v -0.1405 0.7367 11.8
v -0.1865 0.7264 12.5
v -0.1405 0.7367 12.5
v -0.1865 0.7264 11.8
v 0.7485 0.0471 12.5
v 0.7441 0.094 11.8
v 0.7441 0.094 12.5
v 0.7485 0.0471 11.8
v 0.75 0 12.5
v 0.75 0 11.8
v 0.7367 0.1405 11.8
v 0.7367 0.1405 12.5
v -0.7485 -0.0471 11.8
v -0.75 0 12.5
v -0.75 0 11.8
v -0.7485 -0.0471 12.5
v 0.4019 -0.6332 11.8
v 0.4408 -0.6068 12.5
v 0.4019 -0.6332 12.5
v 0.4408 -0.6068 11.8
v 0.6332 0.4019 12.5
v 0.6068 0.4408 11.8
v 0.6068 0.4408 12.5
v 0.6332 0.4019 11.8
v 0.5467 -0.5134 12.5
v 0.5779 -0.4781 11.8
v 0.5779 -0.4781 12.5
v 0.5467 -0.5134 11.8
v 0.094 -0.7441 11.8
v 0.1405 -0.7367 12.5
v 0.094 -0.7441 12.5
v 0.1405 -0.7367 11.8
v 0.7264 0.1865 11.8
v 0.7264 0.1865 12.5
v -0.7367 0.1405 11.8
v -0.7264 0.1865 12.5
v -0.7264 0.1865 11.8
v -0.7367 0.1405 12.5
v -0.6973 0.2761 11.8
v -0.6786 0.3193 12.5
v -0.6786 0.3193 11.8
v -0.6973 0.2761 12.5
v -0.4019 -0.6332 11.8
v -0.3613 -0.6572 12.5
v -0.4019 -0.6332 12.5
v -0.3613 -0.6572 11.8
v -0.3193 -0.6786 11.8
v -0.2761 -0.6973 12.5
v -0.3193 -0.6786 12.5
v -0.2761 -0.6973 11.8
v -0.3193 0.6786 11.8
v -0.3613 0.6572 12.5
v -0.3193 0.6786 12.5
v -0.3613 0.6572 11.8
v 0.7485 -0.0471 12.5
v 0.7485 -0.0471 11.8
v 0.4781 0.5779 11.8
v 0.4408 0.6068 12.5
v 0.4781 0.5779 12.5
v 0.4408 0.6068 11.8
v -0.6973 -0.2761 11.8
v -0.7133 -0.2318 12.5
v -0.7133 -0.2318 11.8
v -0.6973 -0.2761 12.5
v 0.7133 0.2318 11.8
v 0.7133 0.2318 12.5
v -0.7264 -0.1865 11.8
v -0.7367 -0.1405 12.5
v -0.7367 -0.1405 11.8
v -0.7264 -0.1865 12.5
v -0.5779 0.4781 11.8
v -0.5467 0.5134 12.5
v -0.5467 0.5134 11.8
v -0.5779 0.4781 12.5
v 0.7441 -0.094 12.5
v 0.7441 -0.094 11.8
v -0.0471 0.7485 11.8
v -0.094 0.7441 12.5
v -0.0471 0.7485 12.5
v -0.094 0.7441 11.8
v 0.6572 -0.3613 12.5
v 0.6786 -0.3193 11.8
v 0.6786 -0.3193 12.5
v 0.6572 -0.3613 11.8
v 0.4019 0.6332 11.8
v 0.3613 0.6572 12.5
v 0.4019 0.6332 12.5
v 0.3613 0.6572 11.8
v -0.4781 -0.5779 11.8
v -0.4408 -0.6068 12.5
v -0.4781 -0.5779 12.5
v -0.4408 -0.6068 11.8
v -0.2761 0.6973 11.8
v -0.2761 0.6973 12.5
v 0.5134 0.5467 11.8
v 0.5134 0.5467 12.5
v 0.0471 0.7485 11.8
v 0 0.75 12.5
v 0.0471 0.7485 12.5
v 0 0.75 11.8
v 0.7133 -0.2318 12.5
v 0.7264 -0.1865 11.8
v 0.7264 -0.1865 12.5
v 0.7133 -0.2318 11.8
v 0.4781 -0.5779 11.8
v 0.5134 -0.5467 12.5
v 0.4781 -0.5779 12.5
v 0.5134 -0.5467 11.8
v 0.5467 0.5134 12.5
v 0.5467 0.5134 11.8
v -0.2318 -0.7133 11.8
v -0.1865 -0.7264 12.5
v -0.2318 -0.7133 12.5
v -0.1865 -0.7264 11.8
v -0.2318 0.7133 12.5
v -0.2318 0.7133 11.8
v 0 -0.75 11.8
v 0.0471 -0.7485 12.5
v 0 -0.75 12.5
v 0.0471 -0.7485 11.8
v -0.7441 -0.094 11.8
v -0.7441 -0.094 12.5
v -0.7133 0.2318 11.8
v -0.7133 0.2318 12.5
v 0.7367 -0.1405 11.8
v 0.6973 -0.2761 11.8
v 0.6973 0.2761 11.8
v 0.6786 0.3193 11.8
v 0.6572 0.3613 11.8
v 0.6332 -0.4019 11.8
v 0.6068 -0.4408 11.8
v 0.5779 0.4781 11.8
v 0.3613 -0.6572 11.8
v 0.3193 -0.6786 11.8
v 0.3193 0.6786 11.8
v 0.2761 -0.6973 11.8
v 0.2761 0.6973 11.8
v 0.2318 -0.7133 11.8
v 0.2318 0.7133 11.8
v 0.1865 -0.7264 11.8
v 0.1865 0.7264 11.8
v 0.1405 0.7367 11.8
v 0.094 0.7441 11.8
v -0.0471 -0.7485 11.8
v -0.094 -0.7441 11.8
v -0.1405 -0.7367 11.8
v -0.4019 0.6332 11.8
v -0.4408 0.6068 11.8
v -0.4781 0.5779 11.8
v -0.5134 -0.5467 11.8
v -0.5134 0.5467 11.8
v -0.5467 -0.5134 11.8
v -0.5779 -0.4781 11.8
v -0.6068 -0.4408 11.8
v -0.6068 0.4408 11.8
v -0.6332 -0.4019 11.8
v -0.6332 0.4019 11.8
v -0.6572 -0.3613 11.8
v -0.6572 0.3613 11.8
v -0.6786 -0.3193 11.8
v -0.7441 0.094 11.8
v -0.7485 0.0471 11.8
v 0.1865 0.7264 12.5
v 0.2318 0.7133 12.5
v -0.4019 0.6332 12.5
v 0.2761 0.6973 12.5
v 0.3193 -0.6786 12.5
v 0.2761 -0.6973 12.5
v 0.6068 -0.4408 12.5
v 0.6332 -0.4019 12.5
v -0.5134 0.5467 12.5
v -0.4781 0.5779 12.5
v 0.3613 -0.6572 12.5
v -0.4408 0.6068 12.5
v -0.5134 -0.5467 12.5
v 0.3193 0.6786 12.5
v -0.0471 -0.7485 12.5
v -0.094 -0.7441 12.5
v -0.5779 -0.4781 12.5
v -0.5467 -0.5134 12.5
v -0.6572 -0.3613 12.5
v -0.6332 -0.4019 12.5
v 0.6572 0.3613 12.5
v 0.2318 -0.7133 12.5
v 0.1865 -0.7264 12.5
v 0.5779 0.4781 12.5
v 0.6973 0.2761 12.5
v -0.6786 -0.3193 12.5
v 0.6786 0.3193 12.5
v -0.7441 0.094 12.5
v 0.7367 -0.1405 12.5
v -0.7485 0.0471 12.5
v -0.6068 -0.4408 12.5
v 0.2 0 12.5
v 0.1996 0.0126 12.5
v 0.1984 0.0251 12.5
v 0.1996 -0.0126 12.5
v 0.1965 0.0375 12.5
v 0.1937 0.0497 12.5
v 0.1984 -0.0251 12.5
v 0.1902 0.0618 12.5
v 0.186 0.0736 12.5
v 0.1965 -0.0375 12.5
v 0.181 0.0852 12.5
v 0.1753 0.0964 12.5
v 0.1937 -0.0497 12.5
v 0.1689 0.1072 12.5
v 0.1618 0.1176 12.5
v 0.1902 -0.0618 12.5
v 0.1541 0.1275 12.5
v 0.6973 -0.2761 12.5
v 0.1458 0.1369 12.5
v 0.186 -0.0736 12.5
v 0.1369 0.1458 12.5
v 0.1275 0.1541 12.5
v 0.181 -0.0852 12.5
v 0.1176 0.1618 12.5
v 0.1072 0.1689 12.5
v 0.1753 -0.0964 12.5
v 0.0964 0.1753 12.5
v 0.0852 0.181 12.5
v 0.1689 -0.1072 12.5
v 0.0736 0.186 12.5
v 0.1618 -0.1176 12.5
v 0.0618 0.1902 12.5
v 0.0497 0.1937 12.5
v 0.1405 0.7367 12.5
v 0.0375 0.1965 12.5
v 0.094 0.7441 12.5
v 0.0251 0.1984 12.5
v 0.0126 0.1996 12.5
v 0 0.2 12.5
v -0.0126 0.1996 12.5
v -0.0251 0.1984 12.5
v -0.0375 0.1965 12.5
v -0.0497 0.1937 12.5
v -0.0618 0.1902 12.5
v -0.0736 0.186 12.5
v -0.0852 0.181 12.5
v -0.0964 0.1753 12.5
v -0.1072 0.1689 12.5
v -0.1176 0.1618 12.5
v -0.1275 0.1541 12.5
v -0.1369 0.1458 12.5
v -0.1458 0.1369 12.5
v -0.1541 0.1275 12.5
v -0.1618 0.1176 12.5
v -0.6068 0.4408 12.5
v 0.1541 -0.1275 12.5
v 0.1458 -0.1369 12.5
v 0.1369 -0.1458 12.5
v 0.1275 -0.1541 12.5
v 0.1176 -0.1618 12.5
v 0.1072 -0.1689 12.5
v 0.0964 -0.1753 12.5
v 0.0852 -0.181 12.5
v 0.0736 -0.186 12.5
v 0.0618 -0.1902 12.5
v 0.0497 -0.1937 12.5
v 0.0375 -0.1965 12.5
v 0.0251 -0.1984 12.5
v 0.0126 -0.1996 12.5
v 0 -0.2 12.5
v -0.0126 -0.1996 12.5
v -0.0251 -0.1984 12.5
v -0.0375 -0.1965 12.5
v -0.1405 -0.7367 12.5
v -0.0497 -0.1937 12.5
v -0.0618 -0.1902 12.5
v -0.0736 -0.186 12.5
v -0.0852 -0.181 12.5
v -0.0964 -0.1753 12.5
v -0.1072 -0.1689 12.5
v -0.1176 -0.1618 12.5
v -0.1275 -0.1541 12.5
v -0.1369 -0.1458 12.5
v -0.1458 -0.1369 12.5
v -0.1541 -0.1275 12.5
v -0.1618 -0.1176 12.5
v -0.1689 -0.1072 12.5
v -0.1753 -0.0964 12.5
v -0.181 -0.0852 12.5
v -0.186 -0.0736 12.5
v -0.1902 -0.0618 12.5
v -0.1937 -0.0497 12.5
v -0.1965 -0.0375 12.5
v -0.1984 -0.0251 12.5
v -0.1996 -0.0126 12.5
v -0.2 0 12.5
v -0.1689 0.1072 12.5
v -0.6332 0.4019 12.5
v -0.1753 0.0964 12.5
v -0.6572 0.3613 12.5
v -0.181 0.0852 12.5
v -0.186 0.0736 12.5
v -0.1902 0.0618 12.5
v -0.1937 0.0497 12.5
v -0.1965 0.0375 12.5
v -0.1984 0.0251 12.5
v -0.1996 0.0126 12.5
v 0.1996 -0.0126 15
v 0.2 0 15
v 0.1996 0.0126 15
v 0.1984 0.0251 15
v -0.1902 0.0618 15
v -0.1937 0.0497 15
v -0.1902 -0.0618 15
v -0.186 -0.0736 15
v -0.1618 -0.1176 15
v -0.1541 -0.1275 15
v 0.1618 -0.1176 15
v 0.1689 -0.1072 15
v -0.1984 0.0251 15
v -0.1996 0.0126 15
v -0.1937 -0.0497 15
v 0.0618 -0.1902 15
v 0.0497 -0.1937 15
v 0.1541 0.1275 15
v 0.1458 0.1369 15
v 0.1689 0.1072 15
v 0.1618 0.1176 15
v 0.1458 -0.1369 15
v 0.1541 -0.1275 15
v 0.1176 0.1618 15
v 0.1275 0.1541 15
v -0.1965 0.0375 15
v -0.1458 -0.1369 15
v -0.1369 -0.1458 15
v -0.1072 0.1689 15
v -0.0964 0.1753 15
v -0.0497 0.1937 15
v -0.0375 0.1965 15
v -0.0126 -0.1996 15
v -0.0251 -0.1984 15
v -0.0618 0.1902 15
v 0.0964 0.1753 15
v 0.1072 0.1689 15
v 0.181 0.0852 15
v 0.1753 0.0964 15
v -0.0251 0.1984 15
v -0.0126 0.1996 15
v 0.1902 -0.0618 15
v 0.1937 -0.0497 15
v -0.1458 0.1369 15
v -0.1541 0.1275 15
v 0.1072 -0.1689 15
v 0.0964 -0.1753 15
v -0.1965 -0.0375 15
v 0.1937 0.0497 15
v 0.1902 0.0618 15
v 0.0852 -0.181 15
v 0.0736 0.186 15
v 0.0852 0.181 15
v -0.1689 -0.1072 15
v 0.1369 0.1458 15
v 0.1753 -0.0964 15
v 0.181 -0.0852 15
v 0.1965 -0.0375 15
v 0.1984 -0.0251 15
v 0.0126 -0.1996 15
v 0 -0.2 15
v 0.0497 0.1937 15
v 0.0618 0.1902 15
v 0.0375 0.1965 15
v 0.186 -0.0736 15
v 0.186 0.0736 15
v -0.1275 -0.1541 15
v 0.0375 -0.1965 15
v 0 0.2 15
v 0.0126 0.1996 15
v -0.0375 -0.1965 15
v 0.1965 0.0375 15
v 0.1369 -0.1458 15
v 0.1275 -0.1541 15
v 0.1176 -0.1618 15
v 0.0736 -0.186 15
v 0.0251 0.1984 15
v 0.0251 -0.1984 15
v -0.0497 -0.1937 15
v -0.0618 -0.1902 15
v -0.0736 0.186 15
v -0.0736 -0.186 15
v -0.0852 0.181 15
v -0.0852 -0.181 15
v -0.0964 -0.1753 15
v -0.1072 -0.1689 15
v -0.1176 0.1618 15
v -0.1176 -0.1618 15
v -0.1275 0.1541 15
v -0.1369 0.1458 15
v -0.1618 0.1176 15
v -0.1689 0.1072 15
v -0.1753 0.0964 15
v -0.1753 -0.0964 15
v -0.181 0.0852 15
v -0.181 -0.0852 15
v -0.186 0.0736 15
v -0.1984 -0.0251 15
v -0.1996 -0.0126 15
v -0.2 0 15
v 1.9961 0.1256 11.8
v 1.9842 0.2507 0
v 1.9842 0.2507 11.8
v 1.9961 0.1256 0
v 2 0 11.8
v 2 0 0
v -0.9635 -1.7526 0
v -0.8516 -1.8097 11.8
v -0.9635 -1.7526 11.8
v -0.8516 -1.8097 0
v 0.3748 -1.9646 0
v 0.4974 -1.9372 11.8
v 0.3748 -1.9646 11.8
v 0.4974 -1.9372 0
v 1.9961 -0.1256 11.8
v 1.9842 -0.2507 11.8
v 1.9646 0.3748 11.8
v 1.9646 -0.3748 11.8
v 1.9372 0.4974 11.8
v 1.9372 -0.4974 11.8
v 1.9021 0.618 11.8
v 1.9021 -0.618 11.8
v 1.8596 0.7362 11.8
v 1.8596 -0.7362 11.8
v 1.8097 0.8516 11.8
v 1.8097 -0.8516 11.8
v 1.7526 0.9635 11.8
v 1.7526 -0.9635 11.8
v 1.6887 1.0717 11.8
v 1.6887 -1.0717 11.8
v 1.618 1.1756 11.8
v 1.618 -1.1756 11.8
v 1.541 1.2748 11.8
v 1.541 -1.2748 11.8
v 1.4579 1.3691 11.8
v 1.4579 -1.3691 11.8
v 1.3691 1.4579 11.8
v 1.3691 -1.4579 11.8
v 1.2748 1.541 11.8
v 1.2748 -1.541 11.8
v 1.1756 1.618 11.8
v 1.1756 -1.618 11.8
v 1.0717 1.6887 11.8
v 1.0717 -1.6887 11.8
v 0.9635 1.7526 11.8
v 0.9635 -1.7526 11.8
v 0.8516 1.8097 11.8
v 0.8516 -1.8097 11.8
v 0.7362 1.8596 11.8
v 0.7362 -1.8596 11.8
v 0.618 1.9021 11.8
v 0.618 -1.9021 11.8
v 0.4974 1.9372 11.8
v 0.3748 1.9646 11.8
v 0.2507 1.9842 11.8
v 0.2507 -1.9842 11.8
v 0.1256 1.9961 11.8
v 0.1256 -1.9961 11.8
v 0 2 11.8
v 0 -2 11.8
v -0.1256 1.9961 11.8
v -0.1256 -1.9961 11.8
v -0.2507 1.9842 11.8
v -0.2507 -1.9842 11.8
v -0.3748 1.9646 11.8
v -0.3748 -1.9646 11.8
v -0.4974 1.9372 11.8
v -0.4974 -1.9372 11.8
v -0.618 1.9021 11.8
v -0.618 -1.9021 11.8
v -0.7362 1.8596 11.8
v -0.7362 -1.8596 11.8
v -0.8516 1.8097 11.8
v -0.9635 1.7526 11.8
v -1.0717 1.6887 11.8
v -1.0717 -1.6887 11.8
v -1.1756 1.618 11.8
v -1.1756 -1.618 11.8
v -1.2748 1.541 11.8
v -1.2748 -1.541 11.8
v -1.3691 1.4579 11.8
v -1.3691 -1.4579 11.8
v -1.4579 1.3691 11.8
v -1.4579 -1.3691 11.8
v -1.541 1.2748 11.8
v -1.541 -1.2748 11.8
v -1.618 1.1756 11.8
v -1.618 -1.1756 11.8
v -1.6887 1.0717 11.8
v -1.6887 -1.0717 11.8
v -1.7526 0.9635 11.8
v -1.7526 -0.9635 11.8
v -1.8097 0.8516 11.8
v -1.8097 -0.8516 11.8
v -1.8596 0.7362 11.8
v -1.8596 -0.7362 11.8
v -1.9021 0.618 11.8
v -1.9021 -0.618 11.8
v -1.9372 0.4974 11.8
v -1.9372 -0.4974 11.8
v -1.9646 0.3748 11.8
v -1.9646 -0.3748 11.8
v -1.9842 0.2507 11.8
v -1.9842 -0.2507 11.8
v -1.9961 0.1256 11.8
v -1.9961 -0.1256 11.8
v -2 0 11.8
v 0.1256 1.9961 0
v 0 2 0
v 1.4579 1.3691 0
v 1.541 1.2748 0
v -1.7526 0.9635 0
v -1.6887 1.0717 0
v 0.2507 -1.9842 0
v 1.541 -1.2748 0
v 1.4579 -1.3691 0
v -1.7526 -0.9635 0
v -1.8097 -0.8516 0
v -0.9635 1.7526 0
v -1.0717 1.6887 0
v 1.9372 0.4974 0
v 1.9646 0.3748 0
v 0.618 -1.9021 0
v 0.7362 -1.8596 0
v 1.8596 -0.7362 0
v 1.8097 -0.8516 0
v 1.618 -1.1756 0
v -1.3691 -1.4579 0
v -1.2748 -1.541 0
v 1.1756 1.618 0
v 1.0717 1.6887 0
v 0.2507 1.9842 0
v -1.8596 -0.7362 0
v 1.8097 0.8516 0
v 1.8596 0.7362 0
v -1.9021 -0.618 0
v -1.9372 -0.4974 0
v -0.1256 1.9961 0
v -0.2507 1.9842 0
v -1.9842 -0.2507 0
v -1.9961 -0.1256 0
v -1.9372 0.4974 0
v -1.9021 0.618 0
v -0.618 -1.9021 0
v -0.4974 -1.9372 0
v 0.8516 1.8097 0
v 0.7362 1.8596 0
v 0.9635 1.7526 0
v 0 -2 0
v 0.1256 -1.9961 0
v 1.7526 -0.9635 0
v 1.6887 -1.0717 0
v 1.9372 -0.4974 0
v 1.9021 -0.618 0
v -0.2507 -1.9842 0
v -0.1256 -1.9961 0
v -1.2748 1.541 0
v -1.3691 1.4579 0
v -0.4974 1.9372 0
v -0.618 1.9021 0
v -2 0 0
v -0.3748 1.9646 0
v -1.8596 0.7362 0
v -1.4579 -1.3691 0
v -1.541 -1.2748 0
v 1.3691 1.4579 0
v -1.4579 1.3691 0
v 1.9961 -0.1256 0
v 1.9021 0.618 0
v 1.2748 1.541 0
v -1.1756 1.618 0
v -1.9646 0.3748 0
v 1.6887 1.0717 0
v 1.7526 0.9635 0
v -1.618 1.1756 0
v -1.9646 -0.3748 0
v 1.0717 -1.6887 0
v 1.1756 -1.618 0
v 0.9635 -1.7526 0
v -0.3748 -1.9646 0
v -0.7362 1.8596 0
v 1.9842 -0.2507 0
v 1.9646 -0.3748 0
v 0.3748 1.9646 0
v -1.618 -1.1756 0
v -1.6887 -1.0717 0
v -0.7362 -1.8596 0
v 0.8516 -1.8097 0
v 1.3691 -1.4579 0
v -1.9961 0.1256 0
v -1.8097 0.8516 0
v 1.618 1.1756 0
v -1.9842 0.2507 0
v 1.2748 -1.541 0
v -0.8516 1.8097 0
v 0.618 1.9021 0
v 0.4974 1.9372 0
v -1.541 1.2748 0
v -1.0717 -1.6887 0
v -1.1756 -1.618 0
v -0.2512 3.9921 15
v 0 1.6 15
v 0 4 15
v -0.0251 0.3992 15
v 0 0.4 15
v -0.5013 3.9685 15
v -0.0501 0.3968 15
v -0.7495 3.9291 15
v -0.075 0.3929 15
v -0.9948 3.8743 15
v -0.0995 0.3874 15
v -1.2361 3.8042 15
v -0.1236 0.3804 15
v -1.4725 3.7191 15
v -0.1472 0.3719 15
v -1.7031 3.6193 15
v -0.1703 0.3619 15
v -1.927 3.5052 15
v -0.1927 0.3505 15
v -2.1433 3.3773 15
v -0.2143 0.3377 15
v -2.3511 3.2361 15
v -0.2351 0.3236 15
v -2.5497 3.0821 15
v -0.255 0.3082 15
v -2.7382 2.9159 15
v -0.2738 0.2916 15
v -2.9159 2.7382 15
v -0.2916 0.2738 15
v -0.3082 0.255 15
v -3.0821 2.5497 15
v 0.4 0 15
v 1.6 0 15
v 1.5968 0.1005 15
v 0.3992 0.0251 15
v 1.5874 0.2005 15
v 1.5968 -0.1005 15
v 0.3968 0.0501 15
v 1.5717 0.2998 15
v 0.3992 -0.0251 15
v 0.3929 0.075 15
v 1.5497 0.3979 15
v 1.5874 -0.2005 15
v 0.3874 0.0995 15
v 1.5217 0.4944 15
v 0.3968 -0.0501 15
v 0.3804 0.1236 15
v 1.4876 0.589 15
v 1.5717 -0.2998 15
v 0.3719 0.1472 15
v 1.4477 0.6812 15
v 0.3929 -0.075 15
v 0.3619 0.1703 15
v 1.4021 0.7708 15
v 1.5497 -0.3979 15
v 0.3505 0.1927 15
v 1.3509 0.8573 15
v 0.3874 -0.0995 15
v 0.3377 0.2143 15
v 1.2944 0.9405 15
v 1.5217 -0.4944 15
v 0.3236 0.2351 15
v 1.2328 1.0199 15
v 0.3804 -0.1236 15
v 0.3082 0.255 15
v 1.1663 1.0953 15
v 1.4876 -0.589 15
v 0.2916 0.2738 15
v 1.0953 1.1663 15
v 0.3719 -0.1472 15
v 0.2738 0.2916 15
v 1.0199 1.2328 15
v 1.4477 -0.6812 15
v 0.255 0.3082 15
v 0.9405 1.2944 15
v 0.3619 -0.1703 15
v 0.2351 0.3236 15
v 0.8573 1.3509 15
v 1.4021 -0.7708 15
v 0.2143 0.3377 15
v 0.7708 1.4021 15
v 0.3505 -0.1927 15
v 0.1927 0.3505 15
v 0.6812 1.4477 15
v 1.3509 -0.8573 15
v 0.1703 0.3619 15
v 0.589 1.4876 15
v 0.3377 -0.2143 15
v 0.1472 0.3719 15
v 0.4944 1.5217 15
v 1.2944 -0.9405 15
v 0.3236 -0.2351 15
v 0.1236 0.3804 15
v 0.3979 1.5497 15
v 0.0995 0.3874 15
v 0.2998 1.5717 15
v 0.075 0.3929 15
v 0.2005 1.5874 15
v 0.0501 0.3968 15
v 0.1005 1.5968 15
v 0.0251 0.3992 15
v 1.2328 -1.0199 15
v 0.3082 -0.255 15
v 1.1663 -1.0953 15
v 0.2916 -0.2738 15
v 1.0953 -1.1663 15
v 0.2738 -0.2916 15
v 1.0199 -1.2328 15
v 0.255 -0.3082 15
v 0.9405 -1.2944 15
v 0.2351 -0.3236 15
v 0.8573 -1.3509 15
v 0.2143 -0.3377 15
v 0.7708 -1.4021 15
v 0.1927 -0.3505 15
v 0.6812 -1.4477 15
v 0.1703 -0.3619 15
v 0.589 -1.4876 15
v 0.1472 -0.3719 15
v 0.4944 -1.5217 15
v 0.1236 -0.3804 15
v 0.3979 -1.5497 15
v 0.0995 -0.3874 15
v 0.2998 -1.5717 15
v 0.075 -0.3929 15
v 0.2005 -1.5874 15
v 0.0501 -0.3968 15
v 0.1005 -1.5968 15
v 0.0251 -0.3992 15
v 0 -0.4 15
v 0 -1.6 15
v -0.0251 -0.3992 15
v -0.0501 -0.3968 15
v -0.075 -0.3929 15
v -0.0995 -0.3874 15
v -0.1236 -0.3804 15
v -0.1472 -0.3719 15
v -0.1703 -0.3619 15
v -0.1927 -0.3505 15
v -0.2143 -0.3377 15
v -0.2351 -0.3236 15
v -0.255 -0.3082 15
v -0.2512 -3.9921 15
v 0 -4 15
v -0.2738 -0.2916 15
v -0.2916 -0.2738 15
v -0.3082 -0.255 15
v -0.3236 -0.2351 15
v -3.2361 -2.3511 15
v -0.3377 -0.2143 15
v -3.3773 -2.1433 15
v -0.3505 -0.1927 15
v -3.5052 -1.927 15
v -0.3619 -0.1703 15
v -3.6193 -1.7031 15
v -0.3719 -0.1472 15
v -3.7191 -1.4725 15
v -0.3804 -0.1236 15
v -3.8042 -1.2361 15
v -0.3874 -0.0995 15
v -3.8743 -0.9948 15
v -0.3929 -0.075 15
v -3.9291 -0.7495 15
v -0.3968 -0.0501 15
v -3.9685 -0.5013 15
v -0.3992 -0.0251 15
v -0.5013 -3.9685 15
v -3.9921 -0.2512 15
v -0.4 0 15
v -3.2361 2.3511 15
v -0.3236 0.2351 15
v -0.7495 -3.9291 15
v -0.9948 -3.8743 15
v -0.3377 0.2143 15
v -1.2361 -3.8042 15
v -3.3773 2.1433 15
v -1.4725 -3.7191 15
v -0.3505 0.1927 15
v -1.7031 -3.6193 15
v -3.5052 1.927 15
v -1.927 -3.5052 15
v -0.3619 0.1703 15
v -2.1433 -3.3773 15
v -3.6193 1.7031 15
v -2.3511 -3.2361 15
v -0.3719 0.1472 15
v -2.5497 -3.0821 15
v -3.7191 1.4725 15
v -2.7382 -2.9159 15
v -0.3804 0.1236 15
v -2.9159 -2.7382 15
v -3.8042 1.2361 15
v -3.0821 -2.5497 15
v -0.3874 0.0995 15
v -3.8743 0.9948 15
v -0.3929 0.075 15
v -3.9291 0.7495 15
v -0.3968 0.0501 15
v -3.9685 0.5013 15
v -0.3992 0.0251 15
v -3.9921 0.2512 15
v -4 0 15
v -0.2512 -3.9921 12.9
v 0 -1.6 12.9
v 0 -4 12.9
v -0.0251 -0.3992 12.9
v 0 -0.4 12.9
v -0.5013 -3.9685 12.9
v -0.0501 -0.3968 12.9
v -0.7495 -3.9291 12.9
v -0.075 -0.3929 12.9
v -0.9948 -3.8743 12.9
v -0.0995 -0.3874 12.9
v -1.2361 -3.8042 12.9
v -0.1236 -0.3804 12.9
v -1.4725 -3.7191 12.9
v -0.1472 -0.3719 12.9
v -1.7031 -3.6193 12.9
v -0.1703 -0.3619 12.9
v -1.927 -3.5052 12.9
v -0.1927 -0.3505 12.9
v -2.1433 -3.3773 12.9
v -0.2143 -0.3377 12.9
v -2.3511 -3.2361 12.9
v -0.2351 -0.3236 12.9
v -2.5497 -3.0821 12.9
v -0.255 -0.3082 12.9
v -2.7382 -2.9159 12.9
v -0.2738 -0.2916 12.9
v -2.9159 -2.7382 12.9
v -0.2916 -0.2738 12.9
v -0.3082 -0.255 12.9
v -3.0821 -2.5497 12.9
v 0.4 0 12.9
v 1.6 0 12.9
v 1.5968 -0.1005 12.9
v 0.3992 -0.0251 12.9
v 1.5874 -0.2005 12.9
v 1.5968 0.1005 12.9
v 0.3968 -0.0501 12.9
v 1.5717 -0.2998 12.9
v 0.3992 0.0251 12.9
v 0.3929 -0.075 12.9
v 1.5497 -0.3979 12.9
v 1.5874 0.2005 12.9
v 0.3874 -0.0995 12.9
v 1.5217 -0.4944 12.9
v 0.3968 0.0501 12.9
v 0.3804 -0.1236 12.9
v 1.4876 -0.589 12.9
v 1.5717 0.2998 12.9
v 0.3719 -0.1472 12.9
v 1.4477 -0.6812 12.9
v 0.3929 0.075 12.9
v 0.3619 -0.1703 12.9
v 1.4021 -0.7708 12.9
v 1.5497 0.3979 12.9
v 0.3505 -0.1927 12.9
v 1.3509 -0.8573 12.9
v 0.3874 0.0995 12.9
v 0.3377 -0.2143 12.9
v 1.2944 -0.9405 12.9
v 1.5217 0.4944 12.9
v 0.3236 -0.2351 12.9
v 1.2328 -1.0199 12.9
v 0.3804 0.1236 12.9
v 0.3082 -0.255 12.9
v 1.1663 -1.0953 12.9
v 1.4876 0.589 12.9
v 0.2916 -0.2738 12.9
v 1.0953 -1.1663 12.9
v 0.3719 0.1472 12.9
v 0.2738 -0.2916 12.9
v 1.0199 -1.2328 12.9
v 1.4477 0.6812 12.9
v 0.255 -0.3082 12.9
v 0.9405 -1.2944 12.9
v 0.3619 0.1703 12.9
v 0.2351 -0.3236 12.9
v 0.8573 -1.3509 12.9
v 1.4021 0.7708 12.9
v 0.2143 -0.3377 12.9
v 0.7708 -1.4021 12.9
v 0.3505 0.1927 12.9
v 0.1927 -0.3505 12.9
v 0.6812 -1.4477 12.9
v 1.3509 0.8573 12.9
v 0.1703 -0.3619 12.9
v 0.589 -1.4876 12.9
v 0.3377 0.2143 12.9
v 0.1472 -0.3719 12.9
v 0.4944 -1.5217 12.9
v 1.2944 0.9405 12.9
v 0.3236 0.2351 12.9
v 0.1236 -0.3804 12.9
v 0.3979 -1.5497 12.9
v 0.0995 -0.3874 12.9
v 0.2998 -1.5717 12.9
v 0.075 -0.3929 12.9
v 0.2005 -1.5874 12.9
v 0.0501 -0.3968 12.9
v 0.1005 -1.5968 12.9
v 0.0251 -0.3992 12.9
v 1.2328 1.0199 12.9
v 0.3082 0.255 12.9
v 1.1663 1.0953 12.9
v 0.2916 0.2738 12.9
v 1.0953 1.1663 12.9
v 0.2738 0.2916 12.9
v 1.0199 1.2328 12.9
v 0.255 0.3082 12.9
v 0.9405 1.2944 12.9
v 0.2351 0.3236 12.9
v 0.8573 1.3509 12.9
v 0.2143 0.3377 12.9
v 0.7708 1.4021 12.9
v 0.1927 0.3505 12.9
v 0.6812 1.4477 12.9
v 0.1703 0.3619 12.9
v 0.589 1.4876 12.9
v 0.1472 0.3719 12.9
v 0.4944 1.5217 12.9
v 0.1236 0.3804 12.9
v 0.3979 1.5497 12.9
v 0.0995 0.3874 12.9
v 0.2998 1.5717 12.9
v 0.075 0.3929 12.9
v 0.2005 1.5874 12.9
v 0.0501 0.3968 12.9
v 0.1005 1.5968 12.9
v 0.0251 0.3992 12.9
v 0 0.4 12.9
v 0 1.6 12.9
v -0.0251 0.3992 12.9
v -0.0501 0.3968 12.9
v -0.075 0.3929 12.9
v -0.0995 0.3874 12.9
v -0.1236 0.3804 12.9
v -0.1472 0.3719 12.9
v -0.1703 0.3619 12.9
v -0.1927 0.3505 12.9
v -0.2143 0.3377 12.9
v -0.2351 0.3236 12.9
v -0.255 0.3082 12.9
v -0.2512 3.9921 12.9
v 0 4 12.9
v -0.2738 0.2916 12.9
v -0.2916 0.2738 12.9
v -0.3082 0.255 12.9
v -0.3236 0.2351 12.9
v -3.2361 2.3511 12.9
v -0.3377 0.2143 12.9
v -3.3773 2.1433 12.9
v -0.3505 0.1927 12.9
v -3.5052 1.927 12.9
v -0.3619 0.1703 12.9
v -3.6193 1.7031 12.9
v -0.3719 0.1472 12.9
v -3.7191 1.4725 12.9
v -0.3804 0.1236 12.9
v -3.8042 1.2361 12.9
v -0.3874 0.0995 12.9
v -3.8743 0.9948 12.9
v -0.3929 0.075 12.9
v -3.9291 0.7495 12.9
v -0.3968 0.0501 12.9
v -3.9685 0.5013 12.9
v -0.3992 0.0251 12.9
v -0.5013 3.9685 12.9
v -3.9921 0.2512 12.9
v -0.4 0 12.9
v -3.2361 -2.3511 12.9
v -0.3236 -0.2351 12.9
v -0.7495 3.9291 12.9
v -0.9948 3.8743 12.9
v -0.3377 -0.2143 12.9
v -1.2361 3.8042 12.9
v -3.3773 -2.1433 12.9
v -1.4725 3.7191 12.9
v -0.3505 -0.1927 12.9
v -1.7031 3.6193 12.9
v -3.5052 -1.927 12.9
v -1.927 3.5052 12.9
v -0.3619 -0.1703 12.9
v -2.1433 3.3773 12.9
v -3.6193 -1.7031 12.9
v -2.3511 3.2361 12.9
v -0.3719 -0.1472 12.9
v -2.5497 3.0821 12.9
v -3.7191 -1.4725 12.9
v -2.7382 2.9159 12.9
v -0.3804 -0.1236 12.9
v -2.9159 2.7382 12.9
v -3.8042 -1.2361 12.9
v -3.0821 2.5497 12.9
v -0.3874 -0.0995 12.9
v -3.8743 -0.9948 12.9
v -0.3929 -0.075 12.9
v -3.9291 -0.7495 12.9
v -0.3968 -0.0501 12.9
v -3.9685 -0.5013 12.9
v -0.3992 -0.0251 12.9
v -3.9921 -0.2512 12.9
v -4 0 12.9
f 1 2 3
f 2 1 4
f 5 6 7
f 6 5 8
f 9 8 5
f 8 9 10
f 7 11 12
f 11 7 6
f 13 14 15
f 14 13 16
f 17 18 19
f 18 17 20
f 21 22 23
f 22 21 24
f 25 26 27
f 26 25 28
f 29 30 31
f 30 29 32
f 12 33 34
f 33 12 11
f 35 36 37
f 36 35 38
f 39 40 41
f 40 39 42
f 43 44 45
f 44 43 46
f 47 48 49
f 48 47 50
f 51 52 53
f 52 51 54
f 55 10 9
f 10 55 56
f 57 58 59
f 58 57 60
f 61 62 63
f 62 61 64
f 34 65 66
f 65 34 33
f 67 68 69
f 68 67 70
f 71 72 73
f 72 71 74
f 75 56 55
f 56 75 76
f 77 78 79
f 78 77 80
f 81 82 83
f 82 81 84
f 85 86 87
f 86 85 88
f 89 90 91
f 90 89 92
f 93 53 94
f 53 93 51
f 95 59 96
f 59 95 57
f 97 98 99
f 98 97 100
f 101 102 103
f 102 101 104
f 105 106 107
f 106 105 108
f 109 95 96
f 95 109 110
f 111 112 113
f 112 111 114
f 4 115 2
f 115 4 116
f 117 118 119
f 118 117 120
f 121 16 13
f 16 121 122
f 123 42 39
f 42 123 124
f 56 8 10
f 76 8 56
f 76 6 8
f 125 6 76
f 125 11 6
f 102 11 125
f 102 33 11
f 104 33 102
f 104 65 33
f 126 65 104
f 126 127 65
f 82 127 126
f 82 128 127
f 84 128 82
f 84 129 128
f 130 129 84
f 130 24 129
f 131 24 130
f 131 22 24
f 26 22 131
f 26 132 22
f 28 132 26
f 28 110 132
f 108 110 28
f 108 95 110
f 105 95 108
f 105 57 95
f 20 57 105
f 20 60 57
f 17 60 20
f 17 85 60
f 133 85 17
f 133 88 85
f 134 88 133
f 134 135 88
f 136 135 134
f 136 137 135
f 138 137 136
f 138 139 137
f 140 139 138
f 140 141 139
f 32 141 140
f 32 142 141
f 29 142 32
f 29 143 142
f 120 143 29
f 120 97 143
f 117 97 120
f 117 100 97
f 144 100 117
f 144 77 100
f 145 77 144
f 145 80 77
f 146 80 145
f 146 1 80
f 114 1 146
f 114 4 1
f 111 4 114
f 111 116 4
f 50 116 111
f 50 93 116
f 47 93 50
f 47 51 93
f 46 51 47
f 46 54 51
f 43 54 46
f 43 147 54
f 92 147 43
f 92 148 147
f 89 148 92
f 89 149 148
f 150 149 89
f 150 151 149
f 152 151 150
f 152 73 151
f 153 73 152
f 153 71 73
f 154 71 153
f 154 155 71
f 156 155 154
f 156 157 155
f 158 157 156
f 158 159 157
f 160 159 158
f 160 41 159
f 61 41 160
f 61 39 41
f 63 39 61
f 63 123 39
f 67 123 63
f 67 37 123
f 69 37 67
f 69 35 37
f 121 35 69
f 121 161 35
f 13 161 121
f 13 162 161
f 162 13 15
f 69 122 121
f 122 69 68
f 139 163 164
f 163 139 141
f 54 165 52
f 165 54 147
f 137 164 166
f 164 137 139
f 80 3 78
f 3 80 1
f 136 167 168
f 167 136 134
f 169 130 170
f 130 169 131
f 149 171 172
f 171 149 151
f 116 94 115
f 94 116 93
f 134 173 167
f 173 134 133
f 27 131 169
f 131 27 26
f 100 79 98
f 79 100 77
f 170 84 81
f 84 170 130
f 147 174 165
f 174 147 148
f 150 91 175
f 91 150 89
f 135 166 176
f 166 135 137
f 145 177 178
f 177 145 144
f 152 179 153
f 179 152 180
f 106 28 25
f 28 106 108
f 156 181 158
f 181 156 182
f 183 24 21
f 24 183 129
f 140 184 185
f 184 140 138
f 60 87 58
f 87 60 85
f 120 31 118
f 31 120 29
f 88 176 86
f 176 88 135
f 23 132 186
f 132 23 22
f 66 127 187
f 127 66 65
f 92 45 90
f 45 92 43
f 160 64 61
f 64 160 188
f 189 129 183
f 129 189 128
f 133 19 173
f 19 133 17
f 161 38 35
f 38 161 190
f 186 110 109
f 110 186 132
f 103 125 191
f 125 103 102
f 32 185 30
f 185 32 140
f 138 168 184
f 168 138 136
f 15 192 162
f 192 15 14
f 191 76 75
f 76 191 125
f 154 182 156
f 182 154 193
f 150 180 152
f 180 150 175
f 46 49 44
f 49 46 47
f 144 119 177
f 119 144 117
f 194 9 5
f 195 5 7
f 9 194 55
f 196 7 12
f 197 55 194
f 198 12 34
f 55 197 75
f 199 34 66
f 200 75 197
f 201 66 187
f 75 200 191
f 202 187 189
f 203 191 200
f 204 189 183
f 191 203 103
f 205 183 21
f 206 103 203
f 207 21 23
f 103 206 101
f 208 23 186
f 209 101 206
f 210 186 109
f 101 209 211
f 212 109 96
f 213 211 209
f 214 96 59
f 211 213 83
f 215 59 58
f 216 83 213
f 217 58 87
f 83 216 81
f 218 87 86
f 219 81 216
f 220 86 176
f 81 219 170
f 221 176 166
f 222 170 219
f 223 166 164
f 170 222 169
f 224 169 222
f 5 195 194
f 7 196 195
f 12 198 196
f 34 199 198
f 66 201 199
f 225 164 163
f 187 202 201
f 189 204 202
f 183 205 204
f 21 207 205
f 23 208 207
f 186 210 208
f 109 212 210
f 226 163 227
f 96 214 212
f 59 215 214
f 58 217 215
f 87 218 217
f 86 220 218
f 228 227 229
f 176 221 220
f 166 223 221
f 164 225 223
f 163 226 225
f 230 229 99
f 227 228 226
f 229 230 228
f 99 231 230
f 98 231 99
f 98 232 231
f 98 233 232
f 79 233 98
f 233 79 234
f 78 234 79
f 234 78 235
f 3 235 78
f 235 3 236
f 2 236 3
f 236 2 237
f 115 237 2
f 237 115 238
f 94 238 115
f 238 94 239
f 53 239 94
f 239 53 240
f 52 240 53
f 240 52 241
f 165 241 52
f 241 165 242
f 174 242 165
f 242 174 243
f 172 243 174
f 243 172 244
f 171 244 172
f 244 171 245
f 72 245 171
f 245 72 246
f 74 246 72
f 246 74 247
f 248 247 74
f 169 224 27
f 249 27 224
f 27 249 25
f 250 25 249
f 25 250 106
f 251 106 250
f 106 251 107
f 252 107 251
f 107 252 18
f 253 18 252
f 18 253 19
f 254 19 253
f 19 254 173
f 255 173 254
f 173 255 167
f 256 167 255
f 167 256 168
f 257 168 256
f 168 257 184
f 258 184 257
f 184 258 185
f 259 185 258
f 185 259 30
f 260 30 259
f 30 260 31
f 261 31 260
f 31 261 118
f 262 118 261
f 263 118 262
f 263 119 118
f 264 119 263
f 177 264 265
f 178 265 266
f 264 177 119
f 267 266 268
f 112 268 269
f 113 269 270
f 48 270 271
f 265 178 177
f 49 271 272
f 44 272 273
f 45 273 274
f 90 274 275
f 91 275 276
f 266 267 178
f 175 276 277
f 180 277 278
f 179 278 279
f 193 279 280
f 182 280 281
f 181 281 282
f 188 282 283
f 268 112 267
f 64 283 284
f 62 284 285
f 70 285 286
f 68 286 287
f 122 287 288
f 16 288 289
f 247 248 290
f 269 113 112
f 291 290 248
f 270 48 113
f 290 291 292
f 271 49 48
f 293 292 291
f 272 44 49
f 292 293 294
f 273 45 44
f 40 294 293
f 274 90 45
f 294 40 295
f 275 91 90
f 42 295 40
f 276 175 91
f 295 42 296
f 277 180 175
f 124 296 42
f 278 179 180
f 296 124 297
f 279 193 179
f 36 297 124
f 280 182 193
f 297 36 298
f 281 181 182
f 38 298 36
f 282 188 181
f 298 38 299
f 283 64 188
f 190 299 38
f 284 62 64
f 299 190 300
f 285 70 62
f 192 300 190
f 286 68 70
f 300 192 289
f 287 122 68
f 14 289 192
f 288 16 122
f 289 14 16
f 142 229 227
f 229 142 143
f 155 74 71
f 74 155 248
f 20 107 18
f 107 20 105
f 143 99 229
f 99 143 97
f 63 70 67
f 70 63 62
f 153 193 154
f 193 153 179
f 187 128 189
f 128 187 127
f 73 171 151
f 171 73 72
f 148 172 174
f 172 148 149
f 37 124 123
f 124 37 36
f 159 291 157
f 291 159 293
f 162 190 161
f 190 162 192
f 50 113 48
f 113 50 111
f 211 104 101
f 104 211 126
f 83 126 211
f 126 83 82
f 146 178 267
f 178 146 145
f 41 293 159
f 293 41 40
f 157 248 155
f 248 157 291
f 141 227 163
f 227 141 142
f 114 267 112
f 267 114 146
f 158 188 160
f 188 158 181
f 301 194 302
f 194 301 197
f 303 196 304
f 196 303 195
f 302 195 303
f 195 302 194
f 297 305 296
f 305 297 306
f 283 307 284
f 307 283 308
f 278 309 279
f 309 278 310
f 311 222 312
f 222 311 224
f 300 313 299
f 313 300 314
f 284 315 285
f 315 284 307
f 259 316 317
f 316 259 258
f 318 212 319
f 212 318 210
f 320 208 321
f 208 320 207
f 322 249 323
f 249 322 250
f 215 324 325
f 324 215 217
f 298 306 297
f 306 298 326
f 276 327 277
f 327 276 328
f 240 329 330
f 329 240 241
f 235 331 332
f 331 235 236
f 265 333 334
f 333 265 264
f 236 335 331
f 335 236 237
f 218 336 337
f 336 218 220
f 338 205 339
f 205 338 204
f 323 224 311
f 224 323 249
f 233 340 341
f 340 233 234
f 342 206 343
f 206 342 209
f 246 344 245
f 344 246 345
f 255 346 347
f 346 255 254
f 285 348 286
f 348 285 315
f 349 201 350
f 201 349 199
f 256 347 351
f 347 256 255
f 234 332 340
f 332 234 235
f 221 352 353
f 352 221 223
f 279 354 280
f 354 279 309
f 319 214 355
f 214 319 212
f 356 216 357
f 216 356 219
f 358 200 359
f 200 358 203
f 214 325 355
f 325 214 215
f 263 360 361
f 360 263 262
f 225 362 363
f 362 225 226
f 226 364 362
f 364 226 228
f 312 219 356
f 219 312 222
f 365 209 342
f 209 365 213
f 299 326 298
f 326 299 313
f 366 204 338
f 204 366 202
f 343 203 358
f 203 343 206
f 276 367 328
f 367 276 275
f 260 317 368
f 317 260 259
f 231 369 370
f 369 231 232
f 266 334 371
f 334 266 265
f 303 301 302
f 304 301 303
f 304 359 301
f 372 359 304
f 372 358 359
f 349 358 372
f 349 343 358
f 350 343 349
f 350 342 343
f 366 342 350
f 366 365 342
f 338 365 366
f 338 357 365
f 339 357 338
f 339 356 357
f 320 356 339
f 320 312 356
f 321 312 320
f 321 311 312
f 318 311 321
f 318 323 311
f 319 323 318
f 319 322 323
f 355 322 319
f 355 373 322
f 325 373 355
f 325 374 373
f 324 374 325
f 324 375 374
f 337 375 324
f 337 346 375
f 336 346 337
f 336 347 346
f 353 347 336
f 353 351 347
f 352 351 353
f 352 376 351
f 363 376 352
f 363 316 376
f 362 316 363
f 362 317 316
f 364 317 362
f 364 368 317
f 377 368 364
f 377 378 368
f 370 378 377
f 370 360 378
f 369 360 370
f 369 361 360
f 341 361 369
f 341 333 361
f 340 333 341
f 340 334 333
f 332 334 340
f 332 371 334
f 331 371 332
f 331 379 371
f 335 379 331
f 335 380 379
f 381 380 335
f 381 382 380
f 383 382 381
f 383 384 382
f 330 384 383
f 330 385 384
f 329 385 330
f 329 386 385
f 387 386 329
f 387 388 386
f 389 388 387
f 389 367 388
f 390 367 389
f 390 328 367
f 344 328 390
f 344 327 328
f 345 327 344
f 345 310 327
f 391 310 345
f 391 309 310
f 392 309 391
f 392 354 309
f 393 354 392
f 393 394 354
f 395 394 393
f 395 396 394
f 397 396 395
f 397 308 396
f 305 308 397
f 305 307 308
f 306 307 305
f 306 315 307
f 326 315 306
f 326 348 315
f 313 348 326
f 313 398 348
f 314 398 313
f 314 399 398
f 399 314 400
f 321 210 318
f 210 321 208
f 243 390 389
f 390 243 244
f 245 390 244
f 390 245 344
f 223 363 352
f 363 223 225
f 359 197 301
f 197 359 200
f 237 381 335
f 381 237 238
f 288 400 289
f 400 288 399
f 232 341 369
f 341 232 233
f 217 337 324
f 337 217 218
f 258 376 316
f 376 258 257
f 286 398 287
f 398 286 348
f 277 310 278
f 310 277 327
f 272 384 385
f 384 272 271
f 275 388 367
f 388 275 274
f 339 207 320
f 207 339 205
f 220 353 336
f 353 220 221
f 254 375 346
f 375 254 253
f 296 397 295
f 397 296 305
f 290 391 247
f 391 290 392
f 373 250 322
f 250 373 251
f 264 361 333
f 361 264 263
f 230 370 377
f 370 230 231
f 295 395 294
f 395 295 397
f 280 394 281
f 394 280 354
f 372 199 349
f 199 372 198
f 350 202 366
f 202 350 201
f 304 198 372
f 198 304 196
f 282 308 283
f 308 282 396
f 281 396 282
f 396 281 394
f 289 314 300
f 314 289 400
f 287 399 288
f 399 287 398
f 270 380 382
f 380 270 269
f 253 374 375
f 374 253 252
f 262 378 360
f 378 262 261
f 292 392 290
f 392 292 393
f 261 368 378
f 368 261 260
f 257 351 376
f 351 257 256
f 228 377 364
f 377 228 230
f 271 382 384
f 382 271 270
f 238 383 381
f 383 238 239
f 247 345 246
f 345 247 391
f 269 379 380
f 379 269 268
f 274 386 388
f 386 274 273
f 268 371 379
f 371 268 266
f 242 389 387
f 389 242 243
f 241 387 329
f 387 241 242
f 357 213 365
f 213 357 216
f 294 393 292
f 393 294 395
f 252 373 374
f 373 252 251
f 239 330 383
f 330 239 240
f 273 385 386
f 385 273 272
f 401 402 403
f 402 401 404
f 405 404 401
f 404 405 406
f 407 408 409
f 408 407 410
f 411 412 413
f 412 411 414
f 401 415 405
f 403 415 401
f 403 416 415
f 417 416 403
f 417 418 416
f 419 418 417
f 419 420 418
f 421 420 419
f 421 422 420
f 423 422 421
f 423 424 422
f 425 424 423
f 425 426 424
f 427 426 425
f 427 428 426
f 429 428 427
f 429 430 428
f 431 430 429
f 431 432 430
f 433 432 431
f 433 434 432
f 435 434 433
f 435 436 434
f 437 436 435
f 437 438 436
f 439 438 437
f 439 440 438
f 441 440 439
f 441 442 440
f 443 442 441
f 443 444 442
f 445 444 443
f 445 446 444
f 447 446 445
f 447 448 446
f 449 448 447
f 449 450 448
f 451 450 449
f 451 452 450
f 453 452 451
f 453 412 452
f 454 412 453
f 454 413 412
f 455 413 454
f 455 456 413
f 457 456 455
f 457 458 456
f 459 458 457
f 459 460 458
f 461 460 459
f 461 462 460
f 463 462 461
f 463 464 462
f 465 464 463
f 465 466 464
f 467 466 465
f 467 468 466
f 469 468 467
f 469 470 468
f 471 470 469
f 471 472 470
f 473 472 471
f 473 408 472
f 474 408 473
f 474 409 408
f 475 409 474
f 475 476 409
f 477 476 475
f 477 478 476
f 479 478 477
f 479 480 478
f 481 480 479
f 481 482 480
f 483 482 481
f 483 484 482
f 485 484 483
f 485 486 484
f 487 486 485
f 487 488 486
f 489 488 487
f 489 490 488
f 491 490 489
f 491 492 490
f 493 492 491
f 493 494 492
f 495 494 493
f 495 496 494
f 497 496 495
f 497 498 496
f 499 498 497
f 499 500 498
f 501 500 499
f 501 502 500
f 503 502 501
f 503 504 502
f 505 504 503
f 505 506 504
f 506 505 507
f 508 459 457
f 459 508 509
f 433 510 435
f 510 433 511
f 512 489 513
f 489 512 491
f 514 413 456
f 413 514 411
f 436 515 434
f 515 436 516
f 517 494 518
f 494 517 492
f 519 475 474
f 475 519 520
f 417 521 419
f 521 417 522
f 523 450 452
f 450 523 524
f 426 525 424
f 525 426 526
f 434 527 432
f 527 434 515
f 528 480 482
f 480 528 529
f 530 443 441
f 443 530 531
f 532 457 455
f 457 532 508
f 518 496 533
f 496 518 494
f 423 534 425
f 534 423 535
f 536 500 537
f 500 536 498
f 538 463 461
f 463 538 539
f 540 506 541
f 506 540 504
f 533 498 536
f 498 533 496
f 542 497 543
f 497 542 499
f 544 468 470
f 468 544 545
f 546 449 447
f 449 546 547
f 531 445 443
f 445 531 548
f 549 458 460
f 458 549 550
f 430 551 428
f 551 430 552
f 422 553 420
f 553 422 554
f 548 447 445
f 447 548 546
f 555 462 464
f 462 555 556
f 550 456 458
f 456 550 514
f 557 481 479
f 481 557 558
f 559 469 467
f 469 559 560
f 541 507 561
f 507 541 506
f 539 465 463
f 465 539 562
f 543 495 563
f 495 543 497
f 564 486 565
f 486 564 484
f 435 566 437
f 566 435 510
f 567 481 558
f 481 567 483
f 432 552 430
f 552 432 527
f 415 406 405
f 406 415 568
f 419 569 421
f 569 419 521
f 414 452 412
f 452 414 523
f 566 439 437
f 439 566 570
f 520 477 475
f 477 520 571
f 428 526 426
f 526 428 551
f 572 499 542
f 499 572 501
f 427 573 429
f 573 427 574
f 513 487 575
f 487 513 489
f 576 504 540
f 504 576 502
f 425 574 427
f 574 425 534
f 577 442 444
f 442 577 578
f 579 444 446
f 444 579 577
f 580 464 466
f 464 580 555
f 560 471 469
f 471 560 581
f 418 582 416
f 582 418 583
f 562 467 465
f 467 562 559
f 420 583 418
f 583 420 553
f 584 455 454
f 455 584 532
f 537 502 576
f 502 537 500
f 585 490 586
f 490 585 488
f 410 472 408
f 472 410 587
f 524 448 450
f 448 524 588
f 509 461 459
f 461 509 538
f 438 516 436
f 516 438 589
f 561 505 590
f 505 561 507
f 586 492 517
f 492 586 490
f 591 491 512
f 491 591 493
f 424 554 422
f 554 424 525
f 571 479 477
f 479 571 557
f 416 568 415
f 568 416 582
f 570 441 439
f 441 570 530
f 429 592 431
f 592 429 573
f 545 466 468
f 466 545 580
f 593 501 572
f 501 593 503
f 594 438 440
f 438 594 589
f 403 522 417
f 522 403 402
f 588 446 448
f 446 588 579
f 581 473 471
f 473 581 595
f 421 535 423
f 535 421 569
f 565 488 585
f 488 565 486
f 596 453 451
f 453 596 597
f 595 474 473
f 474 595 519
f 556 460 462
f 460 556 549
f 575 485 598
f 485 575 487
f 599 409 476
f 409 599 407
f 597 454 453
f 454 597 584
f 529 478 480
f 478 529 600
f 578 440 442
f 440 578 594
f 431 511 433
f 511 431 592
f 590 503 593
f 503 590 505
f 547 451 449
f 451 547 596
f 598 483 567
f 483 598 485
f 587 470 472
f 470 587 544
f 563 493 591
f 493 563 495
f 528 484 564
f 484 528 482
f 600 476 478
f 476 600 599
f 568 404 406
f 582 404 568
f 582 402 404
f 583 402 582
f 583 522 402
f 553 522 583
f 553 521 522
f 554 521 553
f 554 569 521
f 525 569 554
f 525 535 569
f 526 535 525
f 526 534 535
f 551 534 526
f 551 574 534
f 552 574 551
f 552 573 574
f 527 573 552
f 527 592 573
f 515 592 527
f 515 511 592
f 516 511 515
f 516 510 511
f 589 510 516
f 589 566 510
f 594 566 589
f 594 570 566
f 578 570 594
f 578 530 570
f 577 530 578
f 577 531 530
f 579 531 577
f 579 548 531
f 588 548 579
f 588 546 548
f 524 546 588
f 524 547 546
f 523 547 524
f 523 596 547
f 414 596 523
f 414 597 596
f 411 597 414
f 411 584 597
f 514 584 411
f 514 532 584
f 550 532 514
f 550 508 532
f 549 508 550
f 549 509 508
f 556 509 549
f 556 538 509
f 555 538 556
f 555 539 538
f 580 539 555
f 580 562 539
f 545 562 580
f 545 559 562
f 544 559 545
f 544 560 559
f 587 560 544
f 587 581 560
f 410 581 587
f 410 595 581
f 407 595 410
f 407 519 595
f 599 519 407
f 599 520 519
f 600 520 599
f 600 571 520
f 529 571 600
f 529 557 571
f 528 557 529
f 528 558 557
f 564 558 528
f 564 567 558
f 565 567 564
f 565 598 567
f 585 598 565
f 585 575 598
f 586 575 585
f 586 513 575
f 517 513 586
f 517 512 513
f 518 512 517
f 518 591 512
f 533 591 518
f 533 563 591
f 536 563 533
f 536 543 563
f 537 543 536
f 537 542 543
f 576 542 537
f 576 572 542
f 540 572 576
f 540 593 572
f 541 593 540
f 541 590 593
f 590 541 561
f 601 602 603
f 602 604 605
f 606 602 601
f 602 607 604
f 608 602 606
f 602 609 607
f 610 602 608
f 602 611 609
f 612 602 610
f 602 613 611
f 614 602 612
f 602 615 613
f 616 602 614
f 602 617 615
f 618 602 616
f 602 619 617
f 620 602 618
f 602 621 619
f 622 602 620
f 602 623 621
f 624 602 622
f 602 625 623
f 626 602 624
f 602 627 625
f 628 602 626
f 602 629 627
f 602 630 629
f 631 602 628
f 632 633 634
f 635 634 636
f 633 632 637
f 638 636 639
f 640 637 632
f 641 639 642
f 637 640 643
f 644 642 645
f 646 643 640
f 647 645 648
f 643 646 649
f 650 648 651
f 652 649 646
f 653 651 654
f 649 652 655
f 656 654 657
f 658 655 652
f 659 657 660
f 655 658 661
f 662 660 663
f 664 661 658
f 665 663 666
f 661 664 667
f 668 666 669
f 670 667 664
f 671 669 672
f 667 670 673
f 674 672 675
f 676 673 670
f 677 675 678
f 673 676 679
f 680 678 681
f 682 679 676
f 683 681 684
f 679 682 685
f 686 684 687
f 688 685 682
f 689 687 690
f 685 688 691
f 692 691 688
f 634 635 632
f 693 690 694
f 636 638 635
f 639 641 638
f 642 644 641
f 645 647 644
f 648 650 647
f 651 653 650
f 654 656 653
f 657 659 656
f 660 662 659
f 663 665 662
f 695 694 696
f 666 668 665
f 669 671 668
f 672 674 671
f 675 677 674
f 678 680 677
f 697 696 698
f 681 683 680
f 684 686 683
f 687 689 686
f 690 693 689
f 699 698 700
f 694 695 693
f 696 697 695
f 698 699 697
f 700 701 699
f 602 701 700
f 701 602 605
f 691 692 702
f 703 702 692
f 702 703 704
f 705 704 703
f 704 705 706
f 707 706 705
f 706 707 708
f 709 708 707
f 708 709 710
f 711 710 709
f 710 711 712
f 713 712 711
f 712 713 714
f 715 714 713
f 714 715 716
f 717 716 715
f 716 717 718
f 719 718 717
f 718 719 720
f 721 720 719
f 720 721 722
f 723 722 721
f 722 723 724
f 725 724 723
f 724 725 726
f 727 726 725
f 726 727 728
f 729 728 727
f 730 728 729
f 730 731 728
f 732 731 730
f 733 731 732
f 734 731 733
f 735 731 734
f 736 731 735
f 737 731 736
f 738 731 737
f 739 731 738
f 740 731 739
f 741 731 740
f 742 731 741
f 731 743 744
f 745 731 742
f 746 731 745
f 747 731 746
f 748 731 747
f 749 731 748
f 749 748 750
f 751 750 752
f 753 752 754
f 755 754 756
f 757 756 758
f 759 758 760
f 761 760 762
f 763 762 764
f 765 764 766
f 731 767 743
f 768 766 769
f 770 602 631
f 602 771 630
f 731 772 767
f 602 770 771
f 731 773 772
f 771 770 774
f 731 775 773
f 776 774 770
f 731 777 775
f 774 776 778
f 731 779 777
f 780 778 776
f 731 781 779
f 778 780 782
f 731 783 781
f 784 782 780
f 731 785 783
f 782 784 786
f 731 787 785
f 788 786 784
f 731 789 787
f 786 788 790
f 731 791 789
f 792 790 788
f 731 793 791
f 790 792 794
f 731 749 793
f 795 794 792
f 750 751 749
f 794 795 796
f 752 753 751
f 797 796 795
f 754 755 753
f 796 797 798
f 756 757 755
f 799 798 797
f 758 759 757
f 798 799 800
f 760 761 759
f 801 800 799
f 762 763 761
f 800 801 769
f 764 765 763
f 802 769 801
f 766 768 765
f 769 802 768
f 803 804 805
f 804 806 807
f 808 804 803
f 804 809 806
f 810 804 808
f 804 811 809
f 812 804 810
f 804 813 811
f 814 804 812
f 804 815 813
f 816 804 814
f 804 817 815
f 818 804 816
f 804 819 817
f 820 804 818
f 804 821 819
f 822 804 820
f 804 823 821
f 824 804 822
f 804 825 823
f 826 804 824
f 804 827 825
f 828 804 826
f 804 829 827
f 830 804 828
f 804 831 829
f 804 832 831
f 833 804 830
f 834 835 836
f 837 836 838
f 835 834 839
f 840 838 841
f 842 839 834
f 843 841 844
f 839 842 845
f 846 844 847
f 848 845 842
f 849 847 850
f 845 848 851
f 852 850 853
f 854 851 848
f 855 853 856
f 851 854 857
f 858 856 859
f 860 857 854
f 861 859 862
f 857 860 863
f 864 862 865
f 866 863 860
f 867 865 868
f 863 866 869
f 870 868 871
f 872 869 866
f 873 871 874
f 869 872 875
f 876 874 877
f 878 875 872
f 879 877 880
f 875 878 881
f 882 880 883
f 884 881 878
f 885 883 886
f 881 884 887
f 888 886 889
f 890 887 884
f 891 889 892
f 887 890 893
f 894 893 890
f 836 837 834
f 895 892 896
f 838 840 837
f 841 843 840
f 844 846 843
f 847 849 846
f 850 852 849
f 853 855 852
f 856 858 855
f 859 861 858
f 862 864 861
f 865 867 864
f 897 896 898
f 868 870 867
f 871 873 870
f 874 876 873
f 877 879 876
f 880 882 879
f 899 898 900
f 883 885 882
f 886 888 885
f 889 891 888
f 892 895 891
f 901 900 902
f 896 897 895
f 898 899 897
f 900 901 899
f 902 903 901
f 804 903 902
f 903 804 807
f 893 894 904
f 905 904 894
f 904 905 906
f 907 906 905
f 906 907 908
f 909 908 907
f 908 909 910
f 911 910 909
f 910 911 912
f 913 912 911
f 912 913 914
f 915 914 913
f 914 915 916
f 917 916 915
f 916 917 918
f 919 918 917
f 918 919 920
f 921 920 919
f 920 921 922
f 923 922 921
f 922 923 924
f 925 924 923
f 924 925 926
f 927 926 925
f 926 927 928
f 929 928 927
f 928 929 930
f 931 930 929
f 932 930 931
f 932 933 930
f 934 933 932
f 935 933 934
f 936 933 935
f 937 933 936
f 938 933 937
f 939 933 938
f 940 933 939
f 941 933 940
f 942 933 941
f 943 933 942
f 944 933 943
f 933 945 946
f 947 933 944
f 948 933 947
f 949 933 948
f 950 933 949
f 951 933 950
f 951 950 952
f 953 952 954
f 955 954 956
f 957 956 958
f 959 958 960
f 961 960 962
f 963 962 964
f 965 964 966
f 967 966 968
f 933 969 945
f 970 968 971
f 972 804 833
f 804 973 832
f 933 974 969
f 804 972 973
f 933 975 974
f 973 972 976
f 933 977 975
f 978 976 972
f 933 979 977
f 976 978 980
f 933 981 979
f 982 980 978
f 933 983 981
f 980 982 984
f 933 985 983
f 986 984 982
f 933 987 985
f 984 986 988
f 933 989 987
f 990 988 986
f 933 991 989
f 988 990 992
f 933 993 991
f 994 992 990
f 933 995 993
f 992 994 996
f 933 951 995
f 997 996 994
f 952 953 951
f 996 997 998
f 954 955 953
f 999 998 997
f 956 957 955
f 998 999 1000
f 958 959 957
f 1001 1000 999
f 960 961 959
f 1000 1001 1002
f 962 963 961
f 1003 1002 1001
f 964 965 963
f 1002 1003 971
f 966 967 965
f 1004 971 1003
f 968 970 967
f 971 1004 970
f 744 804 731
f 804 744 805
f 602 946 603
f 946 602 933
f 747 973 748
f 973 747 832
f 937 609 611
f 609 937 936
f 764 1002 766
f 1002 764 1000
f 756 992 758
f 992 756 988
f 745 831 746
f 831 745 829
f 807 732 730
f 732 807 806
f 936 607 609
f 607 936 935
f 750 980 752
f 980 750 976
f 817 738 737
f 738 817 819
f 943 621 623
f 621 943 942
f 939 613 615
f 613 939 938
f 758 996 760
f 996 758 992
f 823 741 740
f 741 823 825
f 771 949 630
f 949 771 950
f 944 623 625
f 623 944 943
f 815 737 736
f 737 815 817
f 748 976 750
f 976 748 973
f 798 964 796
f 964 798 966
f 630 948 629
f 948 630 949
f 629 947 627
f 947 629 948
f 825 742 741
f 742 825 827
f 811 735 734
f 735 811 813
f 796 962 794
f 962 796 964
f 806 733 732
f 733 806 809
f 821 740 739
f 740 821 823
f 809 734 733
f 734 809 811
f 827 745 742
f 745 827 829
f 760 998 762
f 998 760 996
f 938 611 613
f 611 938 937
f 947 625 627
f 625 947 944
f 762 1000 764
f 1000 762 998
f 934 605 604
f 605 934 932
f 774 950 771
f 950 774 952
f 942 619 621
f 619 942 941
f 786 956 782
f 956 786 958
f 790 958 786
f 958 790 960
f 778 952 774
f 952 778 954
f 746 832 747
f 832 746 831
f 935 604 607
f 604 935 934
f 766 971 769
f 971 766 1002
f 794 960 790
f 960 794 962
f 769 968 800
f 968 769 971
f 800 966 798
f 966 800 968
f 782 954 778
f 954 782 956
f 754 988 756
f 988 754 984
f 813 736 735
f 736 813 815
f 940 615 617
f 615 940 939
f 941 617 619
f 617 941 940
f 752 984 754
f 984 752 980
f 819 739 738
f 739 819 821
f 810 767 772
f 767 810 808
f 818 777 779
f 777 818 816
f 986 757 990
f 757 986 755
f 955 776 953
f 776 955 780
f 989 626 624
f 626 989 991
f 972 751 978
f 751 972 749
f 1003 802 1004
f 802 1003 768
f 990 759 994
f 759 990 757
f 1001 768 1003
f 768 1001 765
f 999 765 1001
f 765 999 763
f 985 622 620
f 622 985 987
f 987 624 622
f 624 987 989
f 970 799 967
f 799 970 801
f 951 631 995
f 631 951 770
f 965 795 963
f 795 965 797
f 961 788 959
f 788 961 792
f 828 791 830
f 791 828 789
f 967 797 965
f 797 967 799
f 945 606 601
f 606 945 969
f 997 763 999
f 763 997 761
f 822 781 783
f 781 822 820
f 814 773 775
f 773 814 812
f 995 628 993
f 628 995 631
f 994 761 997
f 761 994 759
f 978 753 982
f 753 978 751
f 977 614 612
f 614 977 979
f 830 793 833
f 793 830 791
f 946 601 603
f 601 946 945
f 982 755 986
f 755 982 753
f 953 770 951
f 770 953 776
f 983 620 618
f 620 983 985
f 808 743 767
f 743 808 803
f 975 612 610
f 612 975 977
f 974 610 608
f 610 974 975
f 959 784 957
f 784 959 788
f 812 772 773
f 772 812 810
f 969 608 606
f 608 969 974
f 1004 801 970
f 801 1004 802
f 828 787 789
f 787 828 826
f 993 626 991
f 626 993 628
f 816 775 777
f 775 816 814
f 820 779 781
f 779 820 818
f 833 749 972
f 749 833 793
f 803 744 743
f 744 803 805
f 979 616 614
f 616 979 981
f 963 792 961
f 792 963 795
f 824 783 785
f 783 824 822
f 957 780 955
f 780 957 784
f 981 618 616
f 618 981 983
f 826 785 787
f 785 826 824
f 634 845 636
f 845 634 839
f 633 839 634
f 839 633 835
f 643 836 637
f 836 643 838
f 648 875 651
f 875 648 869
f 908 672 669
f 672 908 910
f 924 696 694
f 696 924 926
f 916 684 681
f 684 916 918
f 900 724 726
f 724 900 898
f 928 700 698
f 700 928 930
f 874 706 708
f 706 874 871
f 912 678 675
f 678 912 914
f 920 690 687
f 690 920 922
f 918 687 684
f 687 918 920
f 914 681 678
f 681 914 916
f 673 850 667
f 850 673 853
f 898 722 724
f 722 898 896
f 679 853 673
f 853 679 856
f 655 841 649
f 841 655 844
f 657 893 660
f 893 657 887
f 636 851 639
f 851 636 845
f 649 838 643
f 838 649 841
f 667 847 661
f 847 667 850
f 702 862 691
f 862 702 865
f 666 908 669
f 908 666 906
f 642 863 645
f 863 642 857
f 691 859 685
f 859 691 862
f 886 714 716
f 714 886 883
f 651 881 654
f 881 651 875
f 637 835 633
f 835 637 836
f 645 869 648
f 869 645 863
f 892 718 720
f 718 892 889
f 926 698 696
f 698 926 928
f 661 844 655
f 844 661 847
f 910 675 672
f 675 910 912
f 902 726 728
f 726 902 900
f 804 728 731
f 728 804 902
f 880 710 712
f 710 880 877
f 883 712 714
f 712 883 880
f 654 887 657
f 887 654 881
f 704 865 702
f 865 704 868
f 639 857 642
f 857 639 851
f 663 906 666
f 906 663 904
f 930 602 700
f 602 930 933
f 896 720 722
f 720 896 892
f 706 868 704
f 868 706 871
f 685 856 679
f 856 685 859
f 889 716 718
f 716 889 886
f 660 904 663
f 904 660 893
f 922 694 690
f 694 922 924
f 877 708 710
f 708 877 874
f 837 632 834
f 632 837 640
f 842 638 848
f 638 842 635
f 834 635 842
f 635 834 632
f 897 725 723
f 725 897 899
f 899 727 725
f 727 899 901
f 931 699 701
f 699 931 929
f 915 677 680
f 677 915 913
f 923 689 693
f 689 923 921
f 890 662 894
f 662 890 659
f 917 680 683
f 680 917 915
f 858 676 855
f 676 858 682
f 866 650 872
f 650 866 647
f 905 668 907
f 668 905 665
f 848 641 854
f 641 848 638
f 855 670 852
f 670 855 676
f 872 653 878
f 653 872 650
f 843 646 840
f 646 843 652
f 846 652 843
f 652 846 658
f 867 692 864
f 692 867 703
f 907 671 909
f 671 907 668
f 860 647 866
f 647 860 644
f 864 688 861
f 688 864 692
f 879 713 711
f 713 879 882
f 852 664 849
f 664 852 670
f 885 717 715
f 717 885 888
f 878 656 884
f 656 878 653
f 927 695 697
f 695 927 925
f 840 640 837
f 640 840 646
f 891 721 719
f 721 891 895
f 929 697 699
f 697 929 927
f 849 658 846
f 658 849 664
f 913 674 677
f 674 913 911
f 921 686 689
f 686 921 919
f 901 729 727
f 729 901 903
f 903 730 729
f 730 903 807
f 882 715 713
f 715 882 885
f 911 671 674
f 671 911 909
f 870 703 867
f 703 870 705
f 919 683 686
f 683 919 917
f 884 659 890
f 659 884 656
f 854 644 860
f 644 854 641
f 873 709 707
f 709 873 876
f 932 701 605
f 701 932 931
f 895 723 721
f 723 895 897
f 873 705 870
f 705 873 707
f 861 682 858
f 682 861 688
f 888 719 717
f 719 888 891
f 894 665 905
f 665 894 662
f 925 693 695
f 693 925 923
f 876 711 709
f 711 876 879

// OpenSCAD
// file: excentric.scad
use <motor.scad>

debug = ["excentric"];
$fn=100;

eps_h = get_motor_property("ExcentricEpsH");
r = 4;
h = get_motor_property("AxleH")-eps_h;
hole_d = 0.8;

module connector(eps) {
    difference() {
        cylinder(d=4*hole_d, h=h+eps[1], center=true);
        cylinder(d=hole_d, h=h+eps[1], center=true);
    }
}

module excentric(eps, solid) {
    patch_r = r + eps[0];
    patch_h = h + eps[1];
    translate([0,0,patch_h/2]) {
        difference() {
            cylinder(r=patch_r, h=patch_h, center=true);
            if(!solid) {
                translate([r,0,0])
                    cube([2*patch_r,2*patch_r,patch_h],center=true);
                cylinder(d=hole_d, h=patch_h, center=true);
            }
        }
        connector(eps);
    }
}


for(val = debug) {
    if(val == "excentric")
        excentric();
}
// main file
use <excentric.scad>

debug = ["asm"];

$fn=100;
motor_l = 11.8;
motor_d = 4;
front_circle_h = 0.7;
front_circle_d = 1.5;
axle_d = 0.4;
axle_h = 2.5;

excentric_eps_h = 0.4;

wire_h = 0.7;

function get_motor_property(which) =
    which == "MotorL" ? motor_l :
    which == "MotorD" ? motor_d :
    which == "FrontCircleH" ? front_circle_h :
    which == "FrontCircleD" ? front_circle_d :
    which == "AxleD" ? axle_d :
    which == "AxleH" ? axle_h :
    which == "ExcentricEpsH" ? excentric_eps_h :
    which == "FullLength" ? motor_l+front_circle_h+excentric_eps_h+axle_h:
    which == "WireH" ? wire_h :
    assert(false, str("motor haven't property ", which));


module motor(eps) {
    translate([0,0,eps[1]/2]) {
        cylinder(d = motor_d+eps[0], h = motor_l+eps[1]);
        translate([0,0,motor_l+eps[1]]) {
            cylinder(d = front_circle_d+eps[0], h = front_circle_h);
            translate([0,0,front_circle_h])
                cylinder(d = axle_d+eps[0], h = axle_h+eps[1]/2);

        }
    }
}

module motor_asm(eps_motor = [0,0], eps_exc = [0,0], solid = false ) {
    motor(eps_motor);
    translate([0,0,motor_l+front_circle_h+excentric_eps_h+eps_motor[1]])
        excentric(eps_exc, solid);

}


for(val = debug) {
    if(val == "motor")
        motor();
    if(val == "asm")
        motor_asm();
}
